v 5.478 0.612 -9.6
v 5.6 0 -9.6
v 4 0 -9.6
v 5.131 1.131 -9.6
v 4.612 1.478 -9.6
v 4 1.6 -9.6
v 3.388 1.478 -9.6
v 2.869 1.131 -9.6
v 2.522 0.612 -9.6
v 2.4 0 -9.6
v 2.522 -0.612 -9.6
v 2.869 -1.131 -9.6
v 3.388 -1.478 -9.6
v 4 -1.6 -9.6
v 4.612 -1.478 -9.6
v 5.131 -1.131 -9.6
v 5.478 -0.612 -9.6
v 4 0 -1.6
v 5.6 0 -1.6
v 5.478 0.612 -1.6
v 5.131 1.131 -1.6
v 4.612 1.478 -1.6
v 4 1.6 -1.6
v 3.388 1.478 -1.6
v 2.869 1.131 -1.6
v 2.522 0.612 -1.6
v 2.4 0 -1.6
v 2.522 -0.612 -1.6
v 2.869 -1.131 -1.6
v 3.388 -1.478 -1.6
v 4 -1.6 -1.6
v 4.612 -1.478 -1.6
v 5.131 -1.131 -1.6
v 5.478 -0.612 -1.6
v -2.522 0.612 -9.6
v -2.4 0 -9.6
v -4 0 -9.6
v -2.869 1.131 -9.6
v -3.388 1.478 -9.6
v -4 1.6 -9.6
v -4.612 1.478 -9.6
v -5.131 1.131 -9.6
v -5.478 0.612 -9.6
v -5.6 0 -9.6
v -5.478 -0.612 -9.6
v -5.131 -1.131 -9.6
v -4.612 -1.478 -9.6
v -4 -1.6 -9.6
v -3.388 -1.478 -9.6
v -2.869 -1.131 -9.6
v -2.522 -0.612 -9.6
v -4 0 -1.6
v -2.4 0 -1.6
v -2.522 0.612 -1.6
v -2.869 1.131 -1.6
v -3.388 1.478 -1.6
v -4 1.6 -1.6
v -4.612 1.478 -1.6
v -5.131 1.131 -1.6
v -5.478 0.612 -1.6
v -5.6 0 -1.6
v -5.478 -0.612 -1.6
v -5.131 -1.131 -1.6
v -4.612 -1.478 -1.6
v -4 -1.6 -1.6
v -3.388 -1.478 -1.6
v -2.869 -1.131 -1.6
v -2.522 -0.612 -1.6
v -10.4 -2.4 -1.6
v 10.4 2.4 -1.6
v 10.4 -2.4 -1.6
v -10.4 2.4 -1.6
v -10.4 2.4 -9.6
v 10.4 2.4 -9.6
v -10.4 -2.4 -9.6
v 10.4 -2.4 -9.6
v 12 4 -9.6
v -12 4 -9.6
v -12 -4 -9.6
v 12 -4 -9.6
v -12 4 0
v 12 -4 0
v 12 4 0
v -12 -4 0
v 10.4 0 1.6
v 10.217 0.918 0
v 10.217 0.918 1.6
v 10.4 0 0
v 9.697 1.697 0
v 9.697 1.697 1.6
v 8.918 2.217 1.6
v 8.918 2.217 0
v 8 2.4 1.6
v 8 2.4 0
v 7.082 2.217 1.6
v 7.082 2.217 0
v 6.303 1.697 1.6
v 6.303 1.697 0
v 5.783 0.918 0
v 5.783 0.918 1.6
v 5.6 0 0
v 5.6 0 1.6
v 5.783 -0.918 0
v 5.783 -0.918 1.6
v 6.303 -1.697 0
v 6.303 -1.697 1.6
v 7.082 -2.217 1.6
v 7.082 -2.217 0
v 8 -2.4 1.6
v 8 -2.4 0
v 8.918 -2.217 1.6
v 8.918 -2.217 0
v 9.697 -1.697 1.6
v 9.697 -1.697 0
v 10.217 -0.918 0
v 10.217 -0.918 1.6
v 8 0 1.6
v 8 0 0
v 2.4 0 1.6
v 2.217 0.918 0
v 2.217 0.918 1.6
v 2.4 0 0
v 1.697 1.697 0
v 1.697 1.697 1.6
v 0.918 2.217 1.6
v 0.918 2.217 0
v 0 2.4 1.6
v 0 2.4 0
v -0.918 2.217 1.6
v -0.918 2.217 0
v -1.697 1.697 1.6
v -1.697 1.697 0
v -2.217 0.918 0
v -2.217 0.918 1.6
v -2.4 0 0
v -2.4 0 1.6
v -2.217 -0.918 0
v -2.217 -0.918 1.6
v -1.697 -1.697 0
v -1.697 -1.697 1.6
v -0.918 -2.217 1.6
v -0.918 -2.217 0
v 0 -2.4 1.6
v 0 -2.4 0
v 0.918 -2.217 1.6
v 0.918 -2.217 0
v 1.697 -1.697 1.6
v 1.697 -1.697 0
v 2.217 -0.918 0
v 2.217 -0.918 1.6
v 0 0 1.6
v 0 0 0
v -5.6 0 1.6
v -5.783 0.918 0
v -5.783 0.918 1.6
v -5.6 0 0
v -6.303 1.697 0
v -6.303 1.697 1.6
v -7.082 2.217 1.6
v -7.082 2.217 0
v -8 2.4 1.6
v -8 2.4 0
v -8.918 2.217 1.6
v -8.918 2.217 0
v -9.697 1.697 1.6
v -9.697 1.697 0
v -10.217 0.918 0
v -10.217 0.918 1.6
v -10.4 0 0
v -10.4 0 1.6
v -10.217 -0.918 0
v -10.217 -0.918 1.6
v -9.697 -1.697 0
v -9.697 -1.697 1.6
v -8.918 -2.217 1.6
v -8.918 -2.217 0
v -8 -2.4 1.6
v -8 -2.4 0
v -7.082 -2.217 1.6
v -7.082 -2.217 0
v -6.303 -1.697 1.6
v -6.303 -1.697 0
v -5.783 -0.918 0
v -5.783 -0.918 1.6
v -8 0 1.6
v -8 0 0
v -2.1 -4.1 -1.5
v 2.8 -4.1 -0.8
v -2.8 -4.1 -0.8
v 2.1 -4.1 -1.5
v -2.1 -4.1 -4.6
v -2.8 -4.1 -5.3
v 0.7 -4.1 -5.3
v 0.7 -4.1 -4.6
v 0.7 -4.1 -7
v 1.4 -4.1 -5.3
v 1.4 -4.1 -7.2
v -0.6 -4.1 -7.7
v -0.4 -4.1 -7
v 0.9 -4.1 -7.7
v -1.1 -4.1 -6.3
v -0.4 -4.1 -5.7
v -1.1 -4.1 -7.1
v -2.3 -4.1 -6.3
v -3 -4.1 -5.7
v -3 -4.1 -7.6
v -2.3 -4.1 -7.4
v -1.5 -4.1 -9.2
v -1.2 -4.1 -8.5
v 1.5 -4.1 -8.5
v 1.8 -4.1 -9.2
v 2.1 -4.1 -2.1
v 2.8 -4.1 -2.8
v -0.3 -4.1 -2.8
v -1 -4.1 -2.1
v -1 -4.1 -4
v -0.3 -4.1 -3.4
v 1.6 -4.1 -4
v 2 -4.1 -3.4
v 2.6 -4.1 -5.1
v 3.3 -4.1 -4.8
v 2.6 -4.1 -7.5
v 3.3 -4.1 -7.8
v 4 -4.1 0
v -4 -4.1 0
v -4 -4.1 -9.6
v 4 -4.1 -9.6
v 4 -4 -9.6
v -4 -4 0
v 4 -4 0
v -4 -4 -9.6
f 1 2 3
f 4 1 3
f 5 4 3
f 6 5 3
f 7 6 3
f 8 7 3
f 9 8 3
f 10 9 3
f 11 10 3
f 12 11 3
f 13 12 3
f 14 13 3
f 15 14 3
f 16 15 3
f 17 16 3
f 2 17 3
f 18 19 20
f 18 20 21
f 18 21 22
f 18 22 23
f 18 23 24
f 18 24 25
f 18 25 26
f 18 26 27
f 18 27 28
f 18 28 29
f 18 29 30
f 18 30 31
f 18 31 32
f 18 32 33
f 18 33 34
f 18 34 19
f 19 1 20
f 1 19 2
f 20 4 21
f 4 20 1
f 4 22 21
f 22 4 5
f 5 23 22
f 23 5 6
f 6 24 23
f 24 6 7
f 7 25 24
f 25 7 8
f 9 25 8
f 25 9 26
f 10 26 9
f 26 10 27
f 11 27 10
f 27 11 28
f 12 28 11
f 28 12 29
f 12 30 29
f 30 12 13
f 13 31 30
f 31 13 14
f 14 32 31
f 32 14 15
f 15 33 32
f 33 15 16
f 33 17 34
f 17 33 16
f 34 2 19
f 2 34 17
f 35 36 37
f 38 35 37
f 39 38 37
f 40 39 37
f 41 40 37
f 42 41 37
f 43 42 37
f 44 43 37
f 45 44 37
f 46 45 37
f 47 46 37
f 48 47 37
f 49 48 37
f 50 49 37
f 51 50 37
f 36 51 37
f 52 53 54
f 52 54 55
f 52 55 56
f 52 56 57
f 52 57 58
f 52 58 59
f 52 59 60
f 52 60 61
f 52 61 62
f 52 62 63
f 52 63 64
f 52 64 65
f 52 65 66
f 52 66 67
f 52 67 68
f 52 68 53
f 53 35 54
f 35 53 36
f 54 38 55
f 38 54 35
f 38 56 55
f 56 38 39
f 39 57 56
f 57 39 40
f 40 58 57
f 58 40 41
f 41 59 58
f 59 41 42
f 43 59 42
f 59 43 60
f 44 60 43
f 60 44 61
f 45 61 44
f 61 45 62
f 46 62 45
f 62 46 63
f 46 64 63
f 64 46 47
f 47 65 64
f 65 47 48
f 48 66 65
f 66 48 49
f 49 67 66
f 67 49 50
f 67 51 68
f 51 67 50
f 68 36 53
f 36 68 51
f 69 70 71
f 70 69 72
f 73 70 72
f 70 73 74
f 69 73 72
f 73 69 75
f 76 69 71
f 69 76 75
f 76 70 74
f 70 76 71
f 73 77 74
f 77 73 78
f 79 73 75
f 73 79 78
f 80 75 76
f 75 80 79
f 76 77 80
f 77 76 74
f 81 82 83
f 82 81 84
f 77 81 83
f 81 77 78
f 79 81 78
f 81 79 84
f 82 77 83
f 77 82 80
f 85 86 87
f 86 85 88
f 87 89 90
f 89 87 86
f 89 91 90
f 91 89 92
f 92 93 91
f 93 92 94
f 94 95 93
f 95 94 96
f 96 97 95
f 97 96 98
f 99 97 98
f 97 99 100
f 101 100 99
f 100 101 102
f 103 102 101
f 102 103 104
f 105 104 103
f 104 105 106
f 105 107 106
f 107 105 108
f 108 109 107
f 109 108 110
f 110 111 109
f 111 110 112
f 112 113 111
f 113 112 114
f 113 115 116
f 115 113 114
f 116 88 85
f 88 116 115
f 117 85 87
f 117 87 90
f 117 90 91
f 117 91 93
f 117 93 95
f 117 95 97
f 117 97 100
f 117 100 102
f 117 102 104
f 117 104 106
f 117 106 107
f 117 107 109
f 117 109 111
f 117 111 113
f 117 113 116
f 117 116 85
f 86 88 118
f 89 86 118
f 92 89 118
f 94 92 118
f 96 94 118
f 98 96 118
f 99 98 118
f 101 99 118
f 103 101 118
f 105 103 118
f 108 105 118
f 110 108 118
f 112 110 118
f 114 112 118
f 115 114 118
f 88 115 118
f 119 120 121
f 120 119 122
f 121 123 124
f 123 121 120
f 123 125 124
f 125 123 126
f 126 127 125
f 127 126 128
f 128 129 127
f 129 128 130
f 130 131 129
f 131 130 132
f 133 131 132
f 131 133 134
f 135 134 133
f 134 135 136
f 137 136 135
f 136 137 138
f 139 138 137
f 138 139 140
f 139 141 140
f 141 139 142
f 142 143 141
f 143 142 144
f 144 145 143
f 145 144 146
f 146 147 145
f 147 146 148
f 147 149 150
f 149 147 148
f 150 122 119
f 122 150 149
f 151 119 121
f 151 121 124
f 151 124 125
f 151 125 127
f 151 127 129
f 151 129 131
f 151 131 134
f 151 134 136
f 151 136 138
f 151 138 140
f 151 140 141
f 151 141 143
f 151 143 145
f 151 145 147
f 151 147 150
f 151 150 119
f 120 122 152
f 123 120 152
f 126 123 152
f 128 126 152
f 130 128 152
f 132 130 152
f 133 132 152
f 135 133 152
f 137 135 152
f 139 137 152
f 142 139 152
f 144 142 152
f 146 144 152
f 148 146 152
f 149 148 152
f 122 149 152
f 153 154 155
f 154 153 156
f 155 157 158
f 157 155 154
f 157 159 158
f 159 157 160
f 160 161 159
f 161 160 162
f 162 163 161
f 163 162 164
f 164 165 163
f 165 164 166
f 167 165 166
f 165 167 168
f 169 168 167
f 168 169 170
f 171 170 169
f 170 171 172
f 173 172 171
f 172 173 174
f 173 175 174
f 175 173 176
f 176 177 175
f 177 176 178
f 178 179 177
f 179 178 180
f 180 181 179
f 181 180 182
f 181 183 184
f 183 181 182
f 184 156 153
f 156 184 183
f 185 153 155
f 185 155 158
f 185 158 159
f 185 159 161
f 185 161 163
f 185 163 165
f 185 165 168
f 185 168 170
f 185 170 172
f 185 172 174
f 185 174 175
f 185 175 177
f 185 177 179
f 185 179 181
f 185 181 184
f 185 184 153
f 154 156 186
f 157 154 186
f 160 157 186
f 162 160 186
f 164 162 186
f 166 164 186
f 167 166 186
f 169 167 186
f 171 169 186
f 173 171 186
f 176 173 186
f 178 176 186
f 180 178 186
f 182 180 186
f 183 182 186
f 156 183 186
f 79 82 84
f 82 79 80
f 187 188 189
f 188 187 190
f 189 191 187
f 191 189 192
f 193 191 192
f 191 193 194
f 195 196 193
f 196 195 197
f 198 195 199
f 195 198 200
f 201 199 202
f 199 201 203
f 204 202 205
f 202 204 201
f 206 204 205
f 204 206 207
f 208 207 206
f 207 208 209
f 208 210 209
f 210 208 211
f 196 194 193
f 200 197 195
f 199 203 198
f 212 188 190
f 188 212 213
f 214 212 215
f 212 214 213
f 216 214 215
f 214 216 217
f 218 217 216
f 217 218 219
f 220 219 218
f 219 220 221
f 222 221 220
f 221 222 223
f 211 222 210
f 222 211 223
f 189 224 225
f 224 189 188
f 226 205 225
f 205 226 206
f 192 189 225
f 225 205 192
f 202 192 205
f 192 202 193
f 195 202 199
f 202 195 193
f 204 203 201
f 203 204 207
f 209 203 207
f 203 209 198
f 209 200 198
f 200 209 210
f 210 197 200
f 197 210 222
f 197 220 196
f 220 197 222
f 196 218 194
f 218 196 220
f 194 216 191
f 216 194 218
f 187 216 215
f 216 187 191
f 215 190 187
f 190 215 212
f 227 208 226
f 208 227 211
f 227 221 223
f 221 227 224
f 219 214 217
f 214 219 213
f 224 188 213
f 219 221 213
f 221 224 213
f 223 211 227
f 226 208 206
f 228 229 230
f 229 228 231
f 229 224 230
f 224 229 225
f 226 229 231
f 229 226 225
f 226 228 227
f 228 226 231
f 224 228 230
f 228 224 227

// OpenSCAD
// file: ../p/4-4edge.scad
use <../lib.scad>
function ldraw_lib__4_4edge() = [
// 0 Circle 1.0
// 0 Name: 4-4edge.dat
// 0 Author: James Jessiman
// 0 !LDRAW_ORG Primitive UPDATE 2017-01
// 0 !LICENSE Licensed under CC BY 2.0 and CC BY 4.0 : see CAreadme.txt
// 
// 0 BFC CERTIFY CCW
  [0,"BFC","CERTIFY"],
  [0,"BFC","CCW"],
// 
// 0 !HISTORY 1998-12-15 [PTadmin] Official Update 1998-10
// 0 !HISTORY 2005-12-28 [PTadmin] Official Update 2005-01
// 0 !HISTORY 2007-06-24 [PTadmin] Header formatted for Contributor Agreement
// 0 !HISTORY 2008-07-01 [PTadmin] Official Update 2008-01
// 0 !HISTORY 2017-01-15 [Steffen] BFCed
// 0 !HISTORY 2017-12-30 [PTadmin] Official Update 2017-01
// 
// 
// 2 24 1 0 0 0.9239 0 0.3827
  [2,24,1,0,0,0.9239,0,0.3827],
// 2 24 0.9239 0 0.3827 0.7071 0 0.7071
  [2,24,0.9239,0,0.3827,0.7071,0,0.7071],
// 2 24 0.7071 0 0.7071 0.3827 0 0.9239
  [2,24,0.7071,0,0.7071,0.3827,0,0.9239],
// 2 24 0.3827 0 0.9239 0 0 1
  [2,24,0.3827,0,0.9239,0,0,1],
// 2 24 0 0 1 -0.3827 0 0.9239
  [2,24,0,0,1,-0.3827,0,0.9239],
// 2 24 -0.3827 0 0.9239 -0.7071 0 0.7071
  [2,24,-0.3827,0,0.9239,-0.7071,0,0.7071],
// 2 24 -0.7071 0 0.7071 -0.9239 0 0.3827
  [2,24,-0.7071,0,0.7071,-0.9239,0,0.3827],
// 2 24 -0.9239 0 0.3827 -1 0 -0
  [2,24,-0.9239,0,0.3827,-1,0,-0],
// 2 24 -1 0 -0 -0.9239 0 -0.3827
  [2,24,-1,0,-0,-0.9239,0,-0.3827],
// 2 24 -0.9239 0 -0.3827 -0.7071 0 -0.7071
  [2,24,-0.9239,0,-0.3827,-0.7071,0,-0.7071],
// 2 24 -0.7071 0 -0.7071 -0.3827 0 -0.9239
  [2,24,-0.7071,0,-0.7071,-0.3827,0,-0.9239],
// 2 24 -0.3827 0 -0.9239 0 0 -1
  [2,24,-0.3827,0,-0.9239,0,0,-1],
// 2 24 0 0 -1 0.3827 0 -0.9239
  [2,24,0,0,-1,0.3827,0,-0.9239],
// 2 24 0.3827 0 -0.9239 0.7071 0 -0.7071
  [2,24,0.3827,0,-0.9239,0.7071,0,-0.7071],
// 2 24 0.7071 0 -0.7071 0.9239 0 -0.3827
  [2,24,0.7071,0,-0.7071,0.9239,0,-0.3827],
// 2 24 0.9239 0 -0.3827 1 0 0
  [2,24,0.9239,0,-0.3827,1,0,0],
];
module ldraw_lib__4_4edge(step=0, col=false, unit=2/5, alt=false, line=0.2, solid=!$preview)
    makepoly(ldraw_lib__4_4edge(), step=step, col=col, unit=unit, alt=alt, line=line, solid=solid);
ldraw_lib__4_4edge(line=0.2);
// file: ../p/4-4disc.scad
use <../lib.scad>
function ldraw_lib__4_4disc() = [
// 0 Disc 1.0
// 0 Name: 4-4disc.dat
// 0 Author: James Jessiman
// 0 !LDRAW_ORG Primitive UPDATE 2002-02
// 0 !LICENSE Licensed under CC BY 2.0 and CC BY 4.0 : see CAreadme.txt
// 
// 0 BFC CERTIFY CCW
  [0,"BFC","CERTIFY"],
  [0,"BFC","CCW"],
// 
// 0 !HISTORY 1998-12-15 [PTadmin] Official Update 1998-10
// 0 !HISTORY 2002-03-23 [sbliss] Added BFC statement
// 0 !HISTORY 2002-04-25 [PTadmin] Official Update 2002-02
// 0 !HISTORY 2007-06-24 [PTadmin] Header formatted for Contributor Agreement
// 0 !HISTORY 2008-07-01 [PTadmin] Official Update 2008-01
// 
// 
// 3 16 0 0 0 1 0 0 0.9239 0 0.3827
  [3,16,0,0,0,1,0,0,0.9239,0,0.3827],
// 3 16 0 0 0 0.9239 0 0.3827 0.7071 0 0.7071
  [3,16,0,0,0,0.9239,0,0.3827,0.7071,0,0.7071],
// 3 16 0 0 0 0.7071 0 0.7071 0.3827 0 0.9239
  [3,16,0,0,0,0.7071,0,0.7071,0.3827,0,0.9239],
// 3 16 0 0 0 0.3827 0 0.9239 0 0 1
  [3,16,0,0,0,0.3827,0,0.9239,0,0,1],
// 3 16 0 0 0 0 0 1 -0.3827 0 0.9239
  [3,16,0,0,0,0,0,1,-0.3827,0,0.9239],
// 3 16 0 0 0 -0.3827 0 0.9239 -0.7071 0 0.7071
  [3,16,0,0,0,-0.3827,0,0.9239,-0.7071,0,0.7071],
// 3 16 0 0 0 -0.7071 0 0.7071 -0.9239 0 0.3827
  [3,16,0,0,0,-0.7071,0,0.7071,-0.9239,0,0.3827],
// 3 16 0 0 0 -0.9239 0 0.3827 -1 0 -0
  [3,16,0,0,0,-0.9239,0,0.3827,-1,0,-0],
// 3 16 0 0 0 -1 0 -0 -0.9239 0 -0.3827
  [3,16,0,0,0,-1,0,-0,-0.9239,0,-0.3827],
// 3 16 0 0 0 -0.9239 0 -0.3827 -0.7071 0 -0.7071
  [3,16,0,0,0,-0.9239,0,-0.3827,-0.7071,0,-0.7071],
// 3 16 0 0 0 -0.7071 0 -0.7071 -0.3827 0 -0.9239
  [3,16,0,0,0,-0.7071,0,-0.7071,-0.3827,0,-0.9239],
// 3 16 0 0 0 -0.3827 0 -0.9239 0 0 -1
  [3,16,0,0,0,-0.3827,0,-0.9239,0,0,-1],
// 3 16 0 0 0 0 0 -1 0.3827 0 -0.9239
  [3,16,0,0,0,0,0,-1,0.3827,0,-0.9239],
// 3 16 0 0 0 0.3827 0 -0.9239 0.7071 0 -0.7071
  [3,16,0,0,0,0.3827,0,-0.9239,0.7071,0,-0.7071],
// 3 16 0 0 0 0.7071 0 -0.7071 0.9239 0 -0.3827
  [3,16,0,0,0,0.7071,0,-0.7071,0.9239,0,-0.3827],
// 3 16 0 0 0 0.9239 0 -0.3827 1 0 0
  [3,16,0,0,0,0.9239,0,-0.3827,1,0,0],
// 0
];
module ldraw_lib__4_4disc(step=0, col=false, unit=2/5, alt=false, line=0.2, solid=!$preview)
    makepoly(ldraw_lib__4_4disc(), step=step, col=col, unit=unit, alt=alt, line=line, solid=solid);
ldraw_lib__4_4disc(line=0.2);
// file: ../p/4-4cyli.scad
use <../lib.scad>
$fa=1; $fs=0.2;
function ldraw_lib__4_4cyli(realsolid=false) = [
// 0 Cylinder 1.0
// 0 Name: 4-4cyli.dat
// 0 Author: James Jessiman
// 0 !LDRAW_ORG Primitive UPDATE 2005-01
// 0 !LICENSE Licensed under CC BY 2.0 and CC BY 4.0 : see CAreadme.txt
// 
// 0 BFC CERTIFY CCW
  [0,"BFC","CERTIFY"],
  [0,"BFC","CCW"],
// 
// 0 !HISTORY 1998-12-15 [PTadmin] Official Update 1998-10
// 0 !HISTORY 2002-03-23 [sbliss] Added BFC statement; merged headers from files in distributions LDraw 0.27 and Complete.
// 0 !HISTORY 2002-04-25 [PTadmin] Official Update 2002-02
// 0 !HISTORY 2004-12-14 [guyvivan] BFC CCW
// 0 !HISTORY 2005-12-28 [PTadmin] Official Update 2005-01
// 0 !HISTORY 2007-06-24 [PTadmin] Header formatted for Contributor Agreement
// 0 !HISTORY 2008-07-01 [PTadmin] Official Update 2008-01
// 
// 
// 4 16 1 1 0 0.9239 1 0.3827 0.9239 0 0.3827 1 0 0
  [4,16,1,1,0,0.9239,1,0.3827,0.9239,0,0.3827,1,0,0],
// 5 24 1 0 0 1 1 0 0.9239 0 0.3827 0.9239 0 -0.3827
  [5,24,1,0,0,1,1,0,0.9239,0,0.3827,0.9239,0,-0.3827],
// 4 16 0.9239 1 0.3827 0.7071 1 0.7071 0.7071 0 0.7071 0.9239 0 0.3827
  [4,16,0.9239,1,0.3827,0.7071,1,0.7071,0.7071,0,0.7071,0.9239,0,0.3827],
// 5 24 0.9239 0 0.3827 0.9239 1 0.3827 0.7071 0 0.7071 1 0 0
  [5,24,0.9239,0,0.3827,0.9239,1,0.3827,0.7071,0,0.7071,1,0,0],
// 4 16 0.7071 1 0.7071 0.3827 1 0.9239 0.3827 0 0.9239 0.7071 0 0.7071
  [4,16,0.7071,1,0.7071,0.3827,1,0.9239,0.3827,0,0.9239,0.7071,0,0.7071],
// 5 24 0.7071 0 0.7071 0.7071 1 0.7071 0.3827 0 0.9239 0.9239 0 0.3827
  [5,24,0.7071,0,0.7071,0.7071,1,0.7071,0.3827,0,0.9239,0.9239,0,0.3827],
// 4 16 0.3827 1 0.9239 0 1 1 0 0 1 0.3827 0 0.9239
  [4,16,0.3827,1,0.9239,0,1,1,0,0,1,0.3827,0,0.9239],
// 5 24 0.3827 0 0.9239 0.3827 1 0.9239 0 0 1 0.7071 0 0.7071
  [5,24,0.3827,0,0.9239,0.3827,1,0.9239,0,0,1,0.7071,0,0.7071],
// 4 16 0 1 1 -0.3827 1 0.9239 -0.3827 0 0.9239 0 0 1
  [4,16,0,1,1,-0.3827,1,0.9239,-0.3827,0,0.9239,0,0,1],
// 5 24 0 0 1 0 1 1 -0.3827 0 0.9239 0.3827 0 0.9239
  [5,24,0,0,1,0,1,1,-0.3827,0,0.9239,0.3827,0,0.9239],
// 4 16 -0.3827 1 0.9239 -0.7071 1 0.7071 -0.7071 0 0.7071 -0.3827 0 0.9239
  [4,16,-0.3827,1,0.9239,-0.7071,1,0.7071,-0.7071,0,0.7071,-0.3827,0,0.9239],
// 5 24 -0.3827 0 0.9239 -0.3827 1 0.9239 -0.7071 0 0.7071 0 0 1
  [5,24,-0.3827,0,0.9239,-0.3827,1,0.9239,-0.7071,0,0.7071,0,0,1],
// 4 16 -0.7071 1 0.7071 -0.9239 1 0.3827 -0.9239 0 0.3827 -0.7071 0 0.7071
  [4,16,-0.7071,1,0.7071,-0.9239,1,0.3827,-0.9239,0,0.3827,-0.7071,0,0.7071],
// 5 24 -0.7071 0 0.7071 -0.7071 1 0.7071 -0.9239 0 0.3827 -0.3827 0 0.9239
  [5,24,-0.7071,0,0.7071,-0.7071,1,0.7071,-0.9239,0,0.3827,-0.3827,0,0.9239],
// 4 16 -0.9239 1 0.3827 -1 1 0 -1 0 0 -0.9239 0 0.3827
  [4,16,-0.9239,1,0.3827,-1,1,0,-1,0,0,-0.9239,0,0.3827],
// 5 24 -0.9239 0 0.3827 -0.9239 1 0.3827 -1 0 0 -0.7071 0 0.7071
  [5,24,-0.9239,0,0.3827,-0.9239,1,0.3827,-1,0,0,-0.7071,0,0.7071],
// 4 16 -1 1 0 -0.9239 1 -0.3827 -0.9239 0 -0.3827 -1 0 0
  [4,16,-1,1,0,-0.9239,1,-0.3827,-0.9239,0,-0.3827,-1,0,0],
// 5 24 -1 0 0 -1 1 0 -0.9239 0 -0.3827 -0.9239 0 0.3827
  [5,24,-1,0,0,-1,1,0,-0.9239,0,-0.3827,-0.9239,0,0.3827],
// 4 16 -0.9239 1 -0.3827 -0.7071 1 -0.7071 -0.7071 0 -0.7071 -0.9239 0 -0.3827
  [4,16,-0.9239,1,-0.3827,-0.7071,1,-0.7071,-0.7071,0,-0.7071,-0.9239,0,-0.3827],
// 5 24 -0.9239 0 -0.3827 -0.9239 1 -0.3827 -0.7071 0 -0.7071 -1 0 0
  [5,24,-0.9239,0,-0.3827,-0.9239,1,-0.3827,-0.7071,0,-0.7071,-1,0,0],
// 4 16 -0.7071 1 -0.7071 -0.3827 1 -0.9239 -0.3827 0 -0.9239 -0.7071 0 -0.7071
  [4,16,-0.7071,1,-0.7071,-0.3827,1,-0.9239,-0.3827,0,-0.9239,-0.7071,0,-0.7071],
// 5 24 -0.7071 0 -0.7071 -0.7071 1 -0.7071 -0.3827 0 -0.9239 -0.9239 0 -0.3827
  [5,24,-0.7071,0,-0.7071,-0.7071,1,-0.7071,-0.3827,0,-0.9239,-0.9239,0,-0.3827],
// 4 16 -0.3827 1 -0.9239 0 1 -1 0 0 -1 -0.3827 0 -0.9239
  [4,16,-0.3827,1,-0.9239,0,1,-1,0,0,-1,-0.3827,0,-0.9239],
// 5 24 -0.3827 0 -0.9239 -0.3827 1 -0.9239 0 0 -1 -0.7071 0 -0.7071
  [5,24,-0.3827,0,-0.9239,-0.3827,1,-0.9239,0,0,-1,-0.7071,0,-0.7071],
// 4 16 0 1 -1 0.3827 1 -0.9239 0.3827 0 -0.9239 0 0 -1
  [4,16,0,1,-1,0.3827,1,-0.9239,0.3827,0,-0.9239,0,0,-1],
// 5 24 0 0 -1 0 1 -1 0.3827 0 -0.9239 -0.3827 0 -0.9239
  [5,24,0,0,-1,0,1,-1,0.3827,0,-0.9239,-0.3827,0,-0.9239],
// 4 16 0.3827 1 -0.9239 0.7071 1 -0.7071 0.7071 0 -0.7071 0.3827 0 -0.9239
  [4,16,0.3827,1,-0.9239,0.7071,1,-0.7071,0.7071,0,-0.7071,0.3827,0,-0.9239],
// 5 24 0.3827 0 -0.9239 0.3827 1 -0.9239 0.7071 0 -0.7071 0 0 -1
  [5,24,0.3827,0,-0.9239,0.3827,1,-0.9239,0.7071,0,-0.7071,0,0,-1],
// 4 16 0.7071 1 -0.7071 0.9239 1 -0.3827 0.9239 0 -0.3827 0.7071 0 -0.7071
  [4,16,0.7071,1,-0.7071,0.9239,1,-0.3827,0.9239,0,-0.3827,0.7071,0,-0.7071],
// 5 24 0.7071 0 -0.7071 0.7071 1 -0.7071 0.9239 0 -0.3827 0.3827 0 -0.9239
  [5,24,0.7071,0,-0.7071,0.7071,1,-0.7071,0.9239,0,-0.3827,0.3827,0,-0.9239],
// 4 16 0.9239 1 -0.3827 1 1 0 1 0 0 0.9239 0 -0.3827
  [4,16,0.9239,1,-0.3827,1,1,0,1,0,0,0.9239,0,-0.3827],
// 5 24 0.9239 0 -0.3827 0.9239 1 -0.3827 1 0 0 0.7071 0 -0.7071
  [5,24,0.9239,0,-0.3827,0.9239,1,-0.3827,1,0,0,0.7071,0,-0.7071],
// 0
];
module ldraw_lib__4_4cyli(step=0, col=false, unit=2/5, alt=false, line=0.2, solid=!$preview)
    makepoly(ldraw_lib__4_4cyli(solid), step=step, col=col, unit=unit, alt=alt, line=line, solid=solid);
ldraw_lib__4_4cyli(line=0.2);
// file: ../p/stud3.scad
use <../lib.scad>
use <4-4cyli.scad>
use <4-4disc.scad>
use <4-4edge.scad>
function ldraw_lib__stud3() = [
// 0 Stud Tube Solid
// 0 Name: stud3.dat
// 0 Author: James Jessiman
// 0 !LDRAW_ORG Primitive UPDATE 2012-01
// 0 !LICENSE Licensed under CC BY 4.0 : see CAreadme.txt
// 
// 0 BFC CERTIFY CCW
  [0,"BFC","CERTIFY"],
  [0,"BFC","CCW"],
// 
// 0 !HISTORY 2002-04-04 [sbliss] Modified for BFC compliance
// 0 !HISTORY 2002-04-25 [PTadmin] Official Update 2002-02
// 0 !HISTORY 2007-06-24 [PTadmin] Header formatted for Contributor Agreement
// 0 !HISTORY 2008-07-01 [PTadmin] Official Update 2008-01
// 0 !HISTORY 2012-02-16 [Philo] Changed to CCW
// 0 !HISTORY 2012-03-30 [PTadmin] Official Update 2012-01
// 
// 
// 1 16 0 -4 0 4 0 0 0 1 0 0 0 4 4-4edge.dat
  [1,16,0,-4,0,4,0,0,0,1,0,0,0,4, ldraw_lib__4_4edge()],
// 1 16 0 0 0 4 0 0 0 1 0 0 0 4 4-4edge.dat
  [1,16,0,0,0,4,0,0,0,1,0,0,0,4, ldraw_lib__4_4edge()],
// 1 16 0 -4 0 4 0 0 0 1 0 0 0 4 4-4disc.dat
  [1,16,0,-4,0,4,0,0,0,1,0,0,0,4, ldraw_lib__4_4disc()],
  [-1,16,0,0,0,4,0,0,0,-1,0,0,0,4, ldraw_lib__4_4disc()],
// 1 16 0 -4 0 4 0 0 0 4 0 0 0 4 4-4cyli.dat
  [1,16,0,-4,0,4,0,0,0,4,0,0,0,4, ldraw_lib__4_4cyli()],
];
module ldraw_lib__stud3(step=0, col=false, unit=2/5, alt=false, line=0.2, solid=!$preview)
    makepoly(ldraw_lib__stud3(), step=step, col=col, unit=unit, alt=alt, line=line, solid=solid);
ldraw_lib__stud3(line=0.2);
// file: ../p/stud.scad
use <../lib.scad>
use <4-4cyli.scad>
use <4-4disc.scad>
use <4-4edge.scad>
function ldraw_lib__stud() = [
// 0 Stud
// 0 Name: stud.dat
// 0 Author: James Jessiman
// 0 !LDRAW_ORG Primitive UPDATE 2012-01
// 0 !LICENSE Licensed under CC BY 4.0 : see CAreadme.txt
// 
// 0 BFC CERTIFY CCW
  [0,"BFC","CERTIFY"],
  [0,"BFC","CCW"],
// 
// 0 !HISTORY 2002-04-04 [sbliss] Modified for BFC compliance
// 0 !HISTORY 2002-04-25 [PTadmin] Official Update 2002-02
// 0 !HISTORY 2007-06-24 [PTadmin] Header formatted for Contributor Agreement
// 0 !HISTORY 2008-07-01 [PTadmin] Official Update 2008-01
// 0 !HISTORY 2012-02-16 [Philo] Changed to CCW
// 0 !HISTORY 2012-03-30 [PTadmin] Official Update 2012-01
// 
// 
// 1 16 0 0 0 6 0 0 0 1 0 0 0 6 4-4edge.dat
  [1,16,0,0,0,6,0,0,0,1,0,0,0,6, ldraw_lib__4_4edge()],
// 1 16 0 -4 0 6 0 0 0 1 0 0 0 6 4-4edge.dat
  [1,16,0,-4,0,6,0,0,0,1,0,0,0,6, ldraw_lib__4_4edge()],
// 1 16 0 0 0 6 0 0 0 -4 0 0 0 6 4-4cyli.dat
  [1,16,0,0,0,6,0,0,0,-4,0,0,0,6, ldraw_lib__4_4cyli()],
// 1 16 0 -4 0 6 0 0 0 1 0 0 0 6 4-4disc.dat
  [1,16,0,-4,0,6,0,0,0,1,0,0,0,6, ldraw_lib__4_4disc()],
  [-1,16,0,0,0,6,0,0,0,-1,0,0,0,6, ldraw_lib__4_4disc()],
];
module ldraw_lib__stud(step=0, col=false, unit=2/5, alt=false, line=0.2, solid=!$preview)
    makepoly(ldraw_lib__stud(), step=step, col=col, unit=unit, alt=alt, line=line, solid=solid);
ldraw_lib__stud(line=0.2);
// file: ../p/box5.scad
use <../lib.scad>
function ldraw_lib__box5() = [
// 0 Box with 5 Faces and All Edges
// 0 Name: box5.dat
// 0 Author: James Jessiman
// 0 !LDRAW_ORG Primitive UPDATE 2012-01
// 0 !LICENSE Licensed under CC BY 2.0 and CC BY 4.0 : see CAreadme.txt
// 
// 0 BFC CERTIFY CCW
  [0,"BFC","CERTIFY"],
  [0,"BFC","CCW"],
// 
// 0 !HISTORY 2002-04-03 [sbliss] Modified for BFC compliance
// 0 !HISTORY 2002-04-25 [PTadmin] Official Update 2002-02
// 0 !HISTORY 2007-06-24 [PTadmin] Header formatted for Contributor Agreement
// 0 !HISTORY 2008-07-01 [PTadmin] Official Update 2008-01
// 0 !HISTORY 2012-02-16 [Philo] Changed to CCW
// 0 !HISTORY 2012-03-30 [PTadmin] Official Update 2012-01
// 
// 
// 2 24 1 1 1 -1 1 1
  [2,24,1,1,1,-1,1,1],
// 2 24 -1 1 1 -1 1 -1
  [2,24,-1,1,1,-1,1,-1],
// 2 24 -1 1 -1 1 1 -1
  [2,24,-1,1,-1,1,1,-1],
// 2 24 1 1 -1 1 1 1
  [2,24,1,1,-1,1,1,1],
// 2 24 1 0 1 -1 0 1
  [2,24,1,0,1,-1,0,1],
// 2 24 -1 0 1 -1 0 -1
  [2,24,-1,0,1,-1,0,-1],
// 2 24 -1 0 -1 1 0 -1
  [2,24,-1,0,-1,1,0,-1],
// 2 24 1 0 -1 1 0 1
  [2,24,1,0,-1,1,0,1],
// 2 24 1 0 1 1 1 1
  [2,24,1,0,1,1,1,1],
// 2 24 -1 0 1 -1 1 1
  [2,24,-1,0,1,-1,1,1],
// 2 24 1 0 -1 1 1 -1
  [2,24,1,0,-1,1,1,-1],
// 2 24 -1 0 -1 -1 1 -1
  [2,24,-1,0,-1,-1,1,-1],
// 4 16 -1 1 1 1 1 1 1 1 -1 -1 1 -1
  [4,16,-1,1,1,1,1,1,1,1,-1,-1,1,-1],
// 4 16 -1 1 1 -1 0 1 1 0 1 1 1 1
  [4,16,-1,1,1,-1,0,1,1,0,1,1,1,1],
// 4 16 -1 1 -1 -1 0 -1 -1 0 1 -1 1 1
  [4,16,-1,1,-1,-1,0,-1,-1,0,1,-1,1,1],
// 4 16 1 1 -1 1 0 -1 -1 0 -1 -1 1 -1
  [4,16,1,1,-1,1,0,-1,-1,0,-1,-1,1,-1],
// 4 16 1 1 1 1 0 1 1 0 -1 1 1 -1
  [4,16,1,1,1,1,0,1,1,0,-1,1,1,-1],
];
makepoly(ldraw_lib__box5(), line=0.2);
// file: ../p/box4t.scad
use <../lib.scad>
function ldraw_lib__box4t() = [
// 0 Box with 4 Adjacent Faces and All Edges
// 0 Name: box4t.dat
// 0 Author: Tore Eriksson [Tore_Eriksson]
// 0 !LDRAW_ORG Primitive UPDATE 2003-02
// 0 !LICENSE Licensed under CC BY 2.0 and CC BY 4.0 : see CAreadme.txt
// 
// 0 BFC CERTIFY CCW
  [0,"BFC","CERTIFY"],
  [0,"BFC","CCW"],
// 
// 0 !HISTORY 1997-09-29 [PTadmin] Official Update 1997-15
// 0 !HISTORY 2002-08-31 [izanette] Modified with WINDZ for BFC compliance
// 0 !HISTORY 2003-08-01 [PTadmin] Official Update 2003-02
// 0 !HISTORY 2007-06-24 [PTadmin] Header formatted for Contributor Agreement
// 0 !HISTORY 2008-07-01 [PTadmin] Official Update 2008-01
// 
// 
// 2 24 1 1 1 -1 1 1
  [2,24,1,1,1,-1,1,1],
// 2 24 -1 1 1 -1 1 -1
  [2,24,-1,1,1,-1,1,-1],
// 2 24 -1 1 -1 1 1 -1
  [2,24,-1,1,-1,1,1,-1],
// 2 24 1 1 -1 1 1 1
  [2,24,1,1,-1,1,1,1],
// 2 24 1 0 1 -1 0 1
  [2,24,1,0,1,-1,0,1],
// 2 24 -1 0 1 -1 0 -1
  [2,24,-1,0,1,-1,0,-1],
// 2 24 -1 0 -1 1 0 -1
  [2,24,-1,0,-1,1,0,-1],
// 2 24 1 0 -1 1 0 1
  [2,24,1,0,-1,1,0,1],
// 2 24 1 0 1 1 1 1
  [2,24,1,0,1,1,1,1],
// 2 24 -1 0 1 -1 1 1
  [2,24,-1,0,1,-1,1,1],
// 2 24 1 0 -1 1 1 -1
  [2,24,1,0,-1,1,1,-1],
// 2 24 -1 0 -1 -1 1 -1
  [2,24,-1,0,-1,-1,1,-1],
// 4 16 1 1 1 1 1 -1 -1 1 -1 -1 1 1
  [4,16,1,1,1,1,1,-1,-1,1,-1,-1,1,1],
// 4 16 1 1 1 -1 1 1 -1 0 1 1 0 1
  [4,16,1,1,1,-1,1,1,-1,0,1,1,0,1],
// 4 16 -1 1 1 -1 1 -1 -1 0 -1 -1 0 1
  [4,16,-1,1,1,-1,1,-1,-1,0,-1,-1,0,1],
// 0 4 16 -1 1 -1 -1 0 -1 1 0 -1 1 1 -1
// 4 16 1 1 -1 1 1 1 1 0 1 1 0 -1
  [4,16,1,1,-1,1,1,1,1,0,1,1,0,-1],
// 0
];
makepoly(ldraw_lib__box4t(), line=0.2);
// file: s/3622s01.scad
use <../../lib.scad>
use <../../p/box4t.scad>
use <../../p/box5.scad>
use <../../p/stud.scad>
use <../../p/stud3.scad>
function ldraw_lib__s__3622s01() = [
// 0 ~Brick  1 x  3 without Front Face
// 0 Name: s\3622s01.dat
// 0 Author: Andy Westrate [westrate]
// 0 !LDRAW_ORG Subpart UPDATE 2004-02
// 0 !LICENSE Licensed under CC BY 2.0 and CC BY 4.0 : see CAreadme.txt
// 
// 0 BFC CERTIFY CCW
  [0,"BFC","CERTIFY"],
  [0,"BFC","CCW"],
// 
// 0 !HISTORY 2003-10-14 [westrate] Subfiled, BFC'd
// 0 !HISTORY 2004-04-22 [PTadmin] Official Update 2004-02
// 0 !HISTORY 2007-08-31 [PTadmin] Header formatted for Contributor Agreement
// 0 !HISTORY 2008-07-01 [PTadmin] Official Update 2008-01
// 
// 
// 0 // Uncomment the following for front face
// 0 // 4 16 30 0 -10 -30 0 -10 -30 24 -10 30 24 -10
// 1 16 10 4 0 1 0 0 0 -5 0 0 0 1 stud3.dat
  [1,16,10,4,0,1,0,0,0,-5,0,0,0,1, ldraw_lib__stud3()],
// 1 16 -10 4 0 1 0 0 0 -5 0 0 0 1 stud3.dat
  [1,16,-10,4,0,1,0,0,0,-5,0,0,0,1, ldraw_lib__stud3()],
// 
// 0 BFC INVERTNEXT
  [0,"BFC","INVERTNEXT"],
// 1 16 0 24 0 26 0 0 0 -20 0 0 0 6 box5.dat
  [1,16,0,24,0,26,0,0,0,-20,0,0,0,6, ldraw_lib__box5()],
// 
// 4 16 30 24 10 26 24 6 -26 24 6 -30 24 10
  [4,16,30,24,10,26,24,6,-26,24,6,-30,24,10],
// 4 16 -30 24 10 -26 24 6 -26 24 -6 -30 24 -10
  [4,16,-30,24,10,-26,24,6,-26,24,-6,-30,24,-10],
// 4 16 -30 24 -10 -26 24 -6 26 24 -6 30 24 -10
  [4,16,-30,24,-10,-26,24,-6,26,24,-6,30,24,-10],
// 4 16 30 24 -10 26 24 -6 26 24 6 30 24 10
  [4,16,30,24,-10,26,24,-6,26,24,6,30,24,10],
// 
// 1 16 0 24 0 30 0 0 0 -24 0 0 0 10 box4t.dat
  [1,16,0,24,0,30,0,0,0,-24,0,0,0,10, ldraw_lib__box4t()],
// 
// 1 16 20 0 0 1 0 0 0 1 0 0 0 1 stud.dat
  [1,16,20,0,0,1,0,0,0,1,0,0,0,1, ldraw_lib__stud()],
// 1 16 0 0 0 1 0 0 0 1 0 0 0 1 stud.dat
  [1,16,0,0,0,1,0,0,0,1,0,0,0,1, ldraw_lib__stud()],
// 1 16 -20 0 0 1 0 0 0 1 0 0 0 1 stud.dat
  [1,16,-20,0,0,1,0,0,0,1,0,0,0,1, ldraw_lib__stud()],
// 0
];
makepoly(ldraw_lib__s__3622s01(), line=0.2);
// file: ../p/box5-12.scad
use <../lib.scad>
function ldraw_lib__box5_12() = [
// 0 Box with 5 Faces without Any Edges
// 0 Name: box5-12.dat
// 0 Author: Chris Dee [cwdee]
// 0 !LDRAW_ORG Primitive UPDATE 2009-02
// 0 !LICENSE Licensed under CC BY 2.0 and CC BY 4.0 : see CAreadme.txt
// 
// 0 BFC CERTIFY CCW
  [0,"BFC","CERTIFY"],
  [0,"BFC","CCW"],
// 
// 0 !HISTORY 2009-09-03 [PTadmin] Official Update 2009-02
// 
// 
// 4 16 1 1 1 1 1 -1 -1 1 -1 -1 1 1
  [4,16,1,1,1,1,1,-1,-1,1,-1,-1,1,1],
// 4 16 -1 0 1 1 0 1 1 1 1 -1 1 1
  [4,16,-1,0,1,1,0,1,1,1,1,-1,1,1],
// 4 16 -1 0 -1 -1 0 1 -1 1 1 -1 1 -1
  [4,16,-1,0,-1,-1,0,1,-1,1,1,-1,1,-1],
// 4 16 1 0 -1 -1 0 -1 -1 1 -1 1 1 -1
  [4,16,1,0,-1,-1,0,-1,-1,1,-1,1,1,-1],
// 4 16 1 0 1 1 0 -1 1 1 -1 1 1 1
  [4,16,1,0,1,1,0,-1,1,1,-1,1,1,1],
// 0
];
module ldraw_lib__box5_12(step=0, col=false, unit=2/5, alt=false, line=0.2, solid=!$preview)
    makepoly(ldraw_lib__box5_12(), step=step, col=col, unit=unit, alt=alt, line=line, solid=solid);
ldraw_lib__box5_12(line=0.2);
// file: 3622.scad
use <../lib.scad>
use <s/3622s01.scad>
function ldraw_lib__3622() = [
// 0 Brick  1 x  3
// 0 Name: 3622.dat
// 0 Author: James Jessiman
// 0 !LDRAW_ORG Part UPDATE 2004-02
// 0 !LICENSE Licensed under CC BY 2.0 and CC BY 4.0 : see CAreadme.txt
// 
// 0 BFC CERTIFY CCW
  [0,"BFC","CERTIFY"],
  [0,"BFC","CCW"],
// 
// 0 !HISTORY 2003-10-15 [westrate] Subfiled, BFC'd
// 0 !HISTORY 2004-04-22 [PTadmin] Official Update 2004-02
// 0 !HISTORY 2007-06-25 [PTadmin] Header formatted for Contributor Agreement
// 0 !HISTORY 2008-07-01 [PTadmin] Official Update 2008-01
// 
// 
// 1 16 0 0 0 1 0 0 0 1 0 0 0 1 s\3622s01.dat
  [1,16,0,0,0,1,0,0,0,1,0,0,0,1, ldraw_lib__s__3622s01()],
// 4 16 30 0 -10 -30 0 -10 -30 24 -10 30 24 -10
  [4,16,30,0,-10,-30,0,-10,-30,24,-10,30,24,-10],
// 0
];
makepoly(ldraw_lib__3622(), line=0.2);
// file: 164365c.scad
use <../lib.scad>
use <../p/box5-12.scad>
$fa=1; $fs=0.2;
function ldraw_lib__164365c(realsolid=false) = [
// 0 Sticker  1.2 x  1 with Red Outline "5"
// 0 Name: 164365c.dat
// 0 Author: Michael Heidemann [mikeheide]
// 0 !LDRAW_ORG Part UPDATE 2012-02
// 0 !LICENSE Licensed under CC BY 2.0 and CC BY 4.0 : see CAreadme.txt
// 
// 0 BFC CERTIFY CCW
  [0,"BFC","CERTIFY"],
  [0,"BFC","CCW"],
// 
// 0 !KEYWORDS set 6440
// 
// 0 !HISTORY 2012-08-09 [PTadmin] Official Update 2012-02
// 
// 
// 4 4 5.25 -0.25 8.25 7 -0.25 10 -7 -0.25 10 -5.25 -0.25 8.25
  [4,4,5.25,-0.25,8.25,7,-0.25,10,-7,-0.25,10,-5.25,-0.25,8.25],
// 4 4 -5.25 -0.25 0.5 -5.25 -0.25 8.25 -7 -0.25 10 -7 -0.25 -1.25
  [4,4,-5.25,-0.25,0.5,-5.25,-0.25,8.25,-7,-0.25,10,-7,-0.25,-1.25],
// 4 4 -7 -0.25 -1.25 1.75 -0.25 -1.25 1.75 -0.25 0.5 -5.25 -0.25 0.5
  [4,4,-7,-0.25,-1.25,1.75,-0.25,-1.25,1.75,-0.25,0.5,-5.25,-0.25,0.5],
// 4 4 3.5 -0.25 -6 3.5 -0.25 -1.25 1.75 -0.25 -1.25 1.75 -0.25 -5.5
  [4,4,3.5,-0.25,-6,3.5,-0.25,-1.25,1.75,-0.25,-1.25,1.75,-0.25,-5.5],
// 4 4 1.75 -0.25 -5.5 -1 -0.25 -5.5 -1.5 -0.25 -7.25 2.25 -0.25 -7.25
  [4,4,1.75,-0.25,-5.5,-1,-0.25,-5.5,-1.5,-0.25,-7.25,2.25,-0.25,-7.25],
// 4 4 -2.75 -0.25 -3.75 -2.75 -0.25 -5.75 -1 -0.25 -5.5 -1 -0.25 -2.25
  [4,4,-2.75,-0.25,-3.75,-2.75,-0.25,-5.75,-1,-0.25,-5.5,-1,-0.25,-2.25],
// 4 4 -1 -0.25 -2.25 -7.5 -0.25 -2.25 -5.75 -0.25 -3.75 -2.75 -0.25 -3.75
  [4,4,-1,-0.25,-2.25,-7.5,-0.25,-2.25,-5.75,-0.25,-3.75,-2.75,-0.25,-3.75],
// 4 4 -7.5 -0.25 -2.25 -7.5 -0.25 -7 -5.75 -0.25 -6.5 -5.75 -0.25 -3.75
  [4,4,-7.5,-0.25,-2.25,-7.5,-0.25,-7,-5.75,-0.25,-6.5,-5.75,-0.25,-3.75],
// 4 4 -3.75 -0.25 -11 -3 -0.25 -9.25 -5.75 -0.25 -6.5 -7.5 -0.25 -7
  [4,4,-3.75,-0.25,-11,-3,-0.25,-9.25,-5.75,-0.25,-6.5,-7.5,-0.25,-7],
// 4 4 4.5 -0.25 -11 3.75 -0.25 -9.25 -3 -0.25 -9.25 -3.75 -0.25 -11
  [4,4,4.5,-0.25,-11,3.75,-0.25,-9.25,-3,-0.25,-9.25,-3.75,-0.25,-11],
// 3 4 3.5 -0.25 -1.25 1.75 -0.25 0.5 1.75 -0.25 -1.25
  [3,4,3.5,-0.25,-1.25,1.75,-0.25,0.5,1.75,-0.25,-1.25],
// 3 4 2.25 -0.25 -7.25 3.5 -0.25 -6 1.75 -0.25 -5.5
  [3,4,2.25,-0.25,-7.25,3.5,-0.25,-6,1.75,-0.25,-5.5],
// 3 4 -1 -0.25 -5.5 -2.75 -0.25 -5.75 -1.5 -0.25 -7.25
  [3,4,-1,-0.25,-5.5,-2.75,-0.25,-5.75,-1.5,-0.25,-7.25],
// 4 4 7 -0.25 5 7 -0.25 10 5.25 -0.25 8.25 5.25 -0.25 6.75
  [4,4,7,-0.25,5,7,-0.25,10,5.25,-0.25,8.25,5.25,-0.25,6.75],
// 4 4 -0.75 -0.25 5 7 -0.25 5 5.25 -0.25 6.75 -2.5 -0.25 6.75
  [4,4,-0.75,-0.25,5,7,-0.25,5,5.25,-0.25,6.75,-2.5,-0.25,6.75],
// 4 4 -0.75 -0.25 3.5 -0.75 -0.25 5 -2.5 -0.25 6.75 -2.5 -0.25 2
  [4,4,-0.75,-0.25,3.5,-0.75,-0.25,5,-2.5,-0.25,6.75,-2.5,-0.25,2],
// 4 4 5 -0.25 3.5 -0.75 -0.25 3.5 -2.5 -0.25 2 4 -0.25 2
  [4,4,5,-0.25,3.5,-0.75,-0.25,3.5,-2.5,-0.25,2,4,-0.25,2],
// 4 4 8.25 -0.25 0 5 -0.25 3.5 4 -0.25 2 6.5 -0.25 -0.75
  [4,4,8.25,-0.25,0,5,-0.25,3.5,4,-0.25,2,6.5,-0.25,-0.75],
// 4 4 8.25 -0.25 -7.5 8.25 -0.25 0 6.5 -0.25 -0.75 6.5 -0.25 -6.75
  [4,4,8.25,-0.25,-7.5,8.25,-0.25,0,6.5,-0.25,-0.75,6.5,-0.25,-6.75],
// 4 4 6.5 -0.25 -6.75 3.75 -0.25 -9.25 4.5 -0.25 -11 8.25 -0.25 -7.5
  [4,4,6.5,-0.25,-6.75,3.75,-0.25,-9.25,4.5,-0.25,-11,8.25,-0.25,-7.5],
// 4 16 -10 -0.25 12 -7 -0.25 10 7 -0.25 10 10 -0.25 12
  [4,16,-10,-0.25,12,-7,-0.25,10,7,-0.25,10,10,-0.25,12],
// 4 16 -10 -0.25 -12 -7.5 -0.25 -7 -7.5 -0.25 -2.25 -10 -0.25 12
  [4,16,-10,-0.25,-12,-7.5,-0.25,-7,-7.5,-0.25,-2.25,-10,-0.25,12],
// 3 16 -7 -0.25 -1.25 -7 -0.25 10 -10 -0.25 12
  [3,16,-7,-0.25,-1.25,-7,-0.25,10,-10,-0.25,12],
// 3 16 -10 -0.25 12 -7.5 -0.25 -2.25 -7 -0.25 -1.25
  [3,16,-10,-0.25,12,-7.5,-0.25,-2.25,-7,-0.25,-1.25],
// 4 16 -7 -0.25 -1.25 -7.5 -0.25 -2.25 -1 -0.25 -2.25 1.75 -0.25 -1.25
  [4,16,-7,-0.25,-1.25,-7.5,-0.25,-2.25,-1,-0.25,-2.25,1.75,-0.25,-1.25],
// 4 16 1.75 -0.25 -1.25 -1 -0.25 -2.25 -1 -0.25 -5.5 1.75 -0.25 -5.5
  [4,16,1.75,-0.25,-1.25,-1,-0.25,-2.25,-1,-0.25,-5.5,1.75,-0.25,-5.5],
// 4 16 -2.75 -0.25 -5.75 -2.75 -0.25 -3.75 -5.75 -0.25 -3.75 -5.75 -0.25 -6.5
  [4,16,-2.75,-0.25,-5.75,-2.75,-0.25,-3.75,-5.75,-0.25,-3.75,-5.75,-0.25,-6.5],
// 4 16 -1.5 -0.25 -7.25 -2.75 -0.25 -5.75 -5.75 -0.25 -6.5 -3 -0.25 -9.25
  [4,16,-1.5,-0.25,-7.25,-2.75,-0.25,-5.75,-5.75,-0.25,-6.5,-3,-0.25,-9.25],
// 4 16 2.25 -0.25 -7.25 -1.5 -0.25 -7.25 -3 -0.25 -9.25 3.75 -0.25 -9.25
  [4,16,2.25,-0.25,-7.25,-1.5,-0.25,-7.25,-3,-0.25,-9.25,3.75,-0.25,-9.25],
// 4 16 6.5 -0.25 -6.75 3.5 -0.25 -6 2.25 -0.25 -7.25 3.75 -0.25 -9.25
  [4,16,6.5,-0.25,-6.75,3.5,-0.25,-6,2.25,-0.25,-7.25,3.75,-0.25,-9.25],
// 4 16 6.5 -0.25 -0.75 3.5 -0.25 -1.25 3.5 -0.25 -6 6.5 -0.25 -6.75
  [4,16,6.5,-0.25,-0.75,3.5,-0.25,-1.25,3.5,-0.25,-6,6.5,-0.25,-6.75],
// 4 16 4 -0.25 2 1.75 -0.25 0.5 3.5 -0.25 -1.25 6.5 -0.25 -0.75
  [4,16,4,-0.25,2,1.75,-0.25,0.5,3.5,-0.25,-1.25,6.5,-0.25,-0.75],
// 4 16 1.75 -0.25 0.5 4 -0.25 2 -2.5 -0.25 2 -5.25 -0.25 0.5
  [4,16,1.75,-0.25,0.5,4,-0.25,2,-2.5,-0.25,2,-5.25,-0.25,0.5],
// 4 16 -2.5 -0.25 6.75 -5.25 -0.25 8.25 -5.25 -0.25 0.5 -2.5 -0.25 2
  [4,16,-2.5,-0.25,6.75,-5.25,-0.25,8.25,-5.25,-0.25,0.5,-2.5,-0.25,2],
// 4 16 5.25 -0.25 6.75 5.25 -0.25 8.25 -5.25 -0.25 8.25 -2.5 -0.25 6.75
  [4,16,5.25,-0.25,6.75,5.25,-0.25,8.25,-5.25,-0.25,8.25,-2.5,-0.25,6.75],
// 4 16 4.5 -0.25 -11 -3.75 -0.25 -11 -10 -0.25 -12 10 -0.25 -12
  [4,16,4.5,-0.25,-11,-3.75,-0.25,-11,-10,-0.25,-12,10,-0.25,-12],
// 4 16 8.25 -0.25 0 8.25 -0.25 -7.5 10 -0.25 -12 10 -0.25 12
  [4,16,8.25,-0.25,0,8.25,-0.25,-7.5,10,-0.25,-12,10,-0.25,12],
// 4 16 5 -0.25 3.5 7 -0.25 5 -0.75 -0.25 5 -0.75 -0.25 3.5
  [4,16,5,-0.25,3.5,7,-0.25,5,-0.75,-0.25,5,-0.75,-0.25,3.5],
// 3 16 10 -0.25 12 7 -0.25 10 7 -0.25 5
  [3,16,10,-0.25,12,7,-0.25,10,7,-0.25,5],
// 3 16 5 -0.25 3.5 8.25 -0.25 0 7 -0.25 5
  [3,16,5,-0.25,3.5,8.25,-0.25,0,7,-0.25,5],
// 3 16 8.25 -0.25 0 10 -0.25 12 7 -0.25 5
  [3,16,8.25,-0.25,0,10,-0.25,12,7,-0.25,5],
// 3 16 8.25 -0.25 -7.5 4.5 -0.25 -11 10 -0.25 -12
  [3,16,8.25,-0.25,-7.5,4.5,-0.25,-11,10,-0.25,-12],
// 3 16 -10 -0.25 -12 -3.75 -0.25 -11 -7.5 -0.25 -7
  [3,16,-10,-0.25,-12,-3.75,-0.25,-11,-7.5,-0.25,-7],
// 0 // Pattern created wholly or in part by Quad2Dat
// 0 // Thanks James
// 1 16 0 -0.25 0 10 0 0 0 0.25 0 0 0 12 box5-12.dat
  [1,16,0,-0.25,0,10,0,0,0,0.25,0,0,0,12, ldraw_lib__box5_12(realsolid)],
];
module ldraw_lib__164365c(step=0, col=false, unit=2/5, alt=false, line=0.2, solid=!$preview)
    makepoly(ldraw_lib__164365c(solid), step=step, col=col, unit=unit, alt=alt, line=line, solid=solid);
ldraw_lib__164365c(line=0.2);
// main file
use <../lib.scad>
use <164365c.scad>
use <3622.scad>
function ldraw_lib__3622d07() = [
// 0 Brick  1 x  3 with Red Outline "5" Sticker
// 0 Name: 3622d07.dat
// 0 Author: Takeshi Takahashi [RainbowDolphin]
// 0 !LDRAW_ORG Shortcut UPDATE 2024-07
// 0 !LICENSE Licensed under CC BY 4.0 : see CAreadme.txt
// 
// 0 BFC CERTIFY CCW
  [0,"BFC","CERTIFY"],
  [0,"BFC","CCW"],
// 
// 0 !CATEGORY Sticker Shortcut
// 0 !KEYWORDS Airport, Bricklink 3622pb010, Jetport fire squad, set 6440
// 
// 0 !HISTORY 2024-08-26 [OrionP] Official Update 2024-07
// 
// 1 16 0 0 0 1 0 0 0 1 0 0 0 1 3622.dat
  [1,16,0,0,0,1,0,0,0,1,0,0,0,1, ldraw_lib__3622()],
// 1 16 0 12 -10 1 0 0 0 0 -1 0 1 0 164365c.dat
  [1,16,0,12,-10,1,0,0,0,0,-1,0,1,0, ldraw_lib__164365c()],
];
module ldraw_lib__3622d07(step=0, col=false, unit=2/5, alt=false, line=0.2, solid=!$preview)
    makepoly(ldraw_lib__3622d07(), step=step, col=col, unit=unit, alt=alt, line=line, solid=solid);
ldraw_lib__3622d07(line=0.2);
